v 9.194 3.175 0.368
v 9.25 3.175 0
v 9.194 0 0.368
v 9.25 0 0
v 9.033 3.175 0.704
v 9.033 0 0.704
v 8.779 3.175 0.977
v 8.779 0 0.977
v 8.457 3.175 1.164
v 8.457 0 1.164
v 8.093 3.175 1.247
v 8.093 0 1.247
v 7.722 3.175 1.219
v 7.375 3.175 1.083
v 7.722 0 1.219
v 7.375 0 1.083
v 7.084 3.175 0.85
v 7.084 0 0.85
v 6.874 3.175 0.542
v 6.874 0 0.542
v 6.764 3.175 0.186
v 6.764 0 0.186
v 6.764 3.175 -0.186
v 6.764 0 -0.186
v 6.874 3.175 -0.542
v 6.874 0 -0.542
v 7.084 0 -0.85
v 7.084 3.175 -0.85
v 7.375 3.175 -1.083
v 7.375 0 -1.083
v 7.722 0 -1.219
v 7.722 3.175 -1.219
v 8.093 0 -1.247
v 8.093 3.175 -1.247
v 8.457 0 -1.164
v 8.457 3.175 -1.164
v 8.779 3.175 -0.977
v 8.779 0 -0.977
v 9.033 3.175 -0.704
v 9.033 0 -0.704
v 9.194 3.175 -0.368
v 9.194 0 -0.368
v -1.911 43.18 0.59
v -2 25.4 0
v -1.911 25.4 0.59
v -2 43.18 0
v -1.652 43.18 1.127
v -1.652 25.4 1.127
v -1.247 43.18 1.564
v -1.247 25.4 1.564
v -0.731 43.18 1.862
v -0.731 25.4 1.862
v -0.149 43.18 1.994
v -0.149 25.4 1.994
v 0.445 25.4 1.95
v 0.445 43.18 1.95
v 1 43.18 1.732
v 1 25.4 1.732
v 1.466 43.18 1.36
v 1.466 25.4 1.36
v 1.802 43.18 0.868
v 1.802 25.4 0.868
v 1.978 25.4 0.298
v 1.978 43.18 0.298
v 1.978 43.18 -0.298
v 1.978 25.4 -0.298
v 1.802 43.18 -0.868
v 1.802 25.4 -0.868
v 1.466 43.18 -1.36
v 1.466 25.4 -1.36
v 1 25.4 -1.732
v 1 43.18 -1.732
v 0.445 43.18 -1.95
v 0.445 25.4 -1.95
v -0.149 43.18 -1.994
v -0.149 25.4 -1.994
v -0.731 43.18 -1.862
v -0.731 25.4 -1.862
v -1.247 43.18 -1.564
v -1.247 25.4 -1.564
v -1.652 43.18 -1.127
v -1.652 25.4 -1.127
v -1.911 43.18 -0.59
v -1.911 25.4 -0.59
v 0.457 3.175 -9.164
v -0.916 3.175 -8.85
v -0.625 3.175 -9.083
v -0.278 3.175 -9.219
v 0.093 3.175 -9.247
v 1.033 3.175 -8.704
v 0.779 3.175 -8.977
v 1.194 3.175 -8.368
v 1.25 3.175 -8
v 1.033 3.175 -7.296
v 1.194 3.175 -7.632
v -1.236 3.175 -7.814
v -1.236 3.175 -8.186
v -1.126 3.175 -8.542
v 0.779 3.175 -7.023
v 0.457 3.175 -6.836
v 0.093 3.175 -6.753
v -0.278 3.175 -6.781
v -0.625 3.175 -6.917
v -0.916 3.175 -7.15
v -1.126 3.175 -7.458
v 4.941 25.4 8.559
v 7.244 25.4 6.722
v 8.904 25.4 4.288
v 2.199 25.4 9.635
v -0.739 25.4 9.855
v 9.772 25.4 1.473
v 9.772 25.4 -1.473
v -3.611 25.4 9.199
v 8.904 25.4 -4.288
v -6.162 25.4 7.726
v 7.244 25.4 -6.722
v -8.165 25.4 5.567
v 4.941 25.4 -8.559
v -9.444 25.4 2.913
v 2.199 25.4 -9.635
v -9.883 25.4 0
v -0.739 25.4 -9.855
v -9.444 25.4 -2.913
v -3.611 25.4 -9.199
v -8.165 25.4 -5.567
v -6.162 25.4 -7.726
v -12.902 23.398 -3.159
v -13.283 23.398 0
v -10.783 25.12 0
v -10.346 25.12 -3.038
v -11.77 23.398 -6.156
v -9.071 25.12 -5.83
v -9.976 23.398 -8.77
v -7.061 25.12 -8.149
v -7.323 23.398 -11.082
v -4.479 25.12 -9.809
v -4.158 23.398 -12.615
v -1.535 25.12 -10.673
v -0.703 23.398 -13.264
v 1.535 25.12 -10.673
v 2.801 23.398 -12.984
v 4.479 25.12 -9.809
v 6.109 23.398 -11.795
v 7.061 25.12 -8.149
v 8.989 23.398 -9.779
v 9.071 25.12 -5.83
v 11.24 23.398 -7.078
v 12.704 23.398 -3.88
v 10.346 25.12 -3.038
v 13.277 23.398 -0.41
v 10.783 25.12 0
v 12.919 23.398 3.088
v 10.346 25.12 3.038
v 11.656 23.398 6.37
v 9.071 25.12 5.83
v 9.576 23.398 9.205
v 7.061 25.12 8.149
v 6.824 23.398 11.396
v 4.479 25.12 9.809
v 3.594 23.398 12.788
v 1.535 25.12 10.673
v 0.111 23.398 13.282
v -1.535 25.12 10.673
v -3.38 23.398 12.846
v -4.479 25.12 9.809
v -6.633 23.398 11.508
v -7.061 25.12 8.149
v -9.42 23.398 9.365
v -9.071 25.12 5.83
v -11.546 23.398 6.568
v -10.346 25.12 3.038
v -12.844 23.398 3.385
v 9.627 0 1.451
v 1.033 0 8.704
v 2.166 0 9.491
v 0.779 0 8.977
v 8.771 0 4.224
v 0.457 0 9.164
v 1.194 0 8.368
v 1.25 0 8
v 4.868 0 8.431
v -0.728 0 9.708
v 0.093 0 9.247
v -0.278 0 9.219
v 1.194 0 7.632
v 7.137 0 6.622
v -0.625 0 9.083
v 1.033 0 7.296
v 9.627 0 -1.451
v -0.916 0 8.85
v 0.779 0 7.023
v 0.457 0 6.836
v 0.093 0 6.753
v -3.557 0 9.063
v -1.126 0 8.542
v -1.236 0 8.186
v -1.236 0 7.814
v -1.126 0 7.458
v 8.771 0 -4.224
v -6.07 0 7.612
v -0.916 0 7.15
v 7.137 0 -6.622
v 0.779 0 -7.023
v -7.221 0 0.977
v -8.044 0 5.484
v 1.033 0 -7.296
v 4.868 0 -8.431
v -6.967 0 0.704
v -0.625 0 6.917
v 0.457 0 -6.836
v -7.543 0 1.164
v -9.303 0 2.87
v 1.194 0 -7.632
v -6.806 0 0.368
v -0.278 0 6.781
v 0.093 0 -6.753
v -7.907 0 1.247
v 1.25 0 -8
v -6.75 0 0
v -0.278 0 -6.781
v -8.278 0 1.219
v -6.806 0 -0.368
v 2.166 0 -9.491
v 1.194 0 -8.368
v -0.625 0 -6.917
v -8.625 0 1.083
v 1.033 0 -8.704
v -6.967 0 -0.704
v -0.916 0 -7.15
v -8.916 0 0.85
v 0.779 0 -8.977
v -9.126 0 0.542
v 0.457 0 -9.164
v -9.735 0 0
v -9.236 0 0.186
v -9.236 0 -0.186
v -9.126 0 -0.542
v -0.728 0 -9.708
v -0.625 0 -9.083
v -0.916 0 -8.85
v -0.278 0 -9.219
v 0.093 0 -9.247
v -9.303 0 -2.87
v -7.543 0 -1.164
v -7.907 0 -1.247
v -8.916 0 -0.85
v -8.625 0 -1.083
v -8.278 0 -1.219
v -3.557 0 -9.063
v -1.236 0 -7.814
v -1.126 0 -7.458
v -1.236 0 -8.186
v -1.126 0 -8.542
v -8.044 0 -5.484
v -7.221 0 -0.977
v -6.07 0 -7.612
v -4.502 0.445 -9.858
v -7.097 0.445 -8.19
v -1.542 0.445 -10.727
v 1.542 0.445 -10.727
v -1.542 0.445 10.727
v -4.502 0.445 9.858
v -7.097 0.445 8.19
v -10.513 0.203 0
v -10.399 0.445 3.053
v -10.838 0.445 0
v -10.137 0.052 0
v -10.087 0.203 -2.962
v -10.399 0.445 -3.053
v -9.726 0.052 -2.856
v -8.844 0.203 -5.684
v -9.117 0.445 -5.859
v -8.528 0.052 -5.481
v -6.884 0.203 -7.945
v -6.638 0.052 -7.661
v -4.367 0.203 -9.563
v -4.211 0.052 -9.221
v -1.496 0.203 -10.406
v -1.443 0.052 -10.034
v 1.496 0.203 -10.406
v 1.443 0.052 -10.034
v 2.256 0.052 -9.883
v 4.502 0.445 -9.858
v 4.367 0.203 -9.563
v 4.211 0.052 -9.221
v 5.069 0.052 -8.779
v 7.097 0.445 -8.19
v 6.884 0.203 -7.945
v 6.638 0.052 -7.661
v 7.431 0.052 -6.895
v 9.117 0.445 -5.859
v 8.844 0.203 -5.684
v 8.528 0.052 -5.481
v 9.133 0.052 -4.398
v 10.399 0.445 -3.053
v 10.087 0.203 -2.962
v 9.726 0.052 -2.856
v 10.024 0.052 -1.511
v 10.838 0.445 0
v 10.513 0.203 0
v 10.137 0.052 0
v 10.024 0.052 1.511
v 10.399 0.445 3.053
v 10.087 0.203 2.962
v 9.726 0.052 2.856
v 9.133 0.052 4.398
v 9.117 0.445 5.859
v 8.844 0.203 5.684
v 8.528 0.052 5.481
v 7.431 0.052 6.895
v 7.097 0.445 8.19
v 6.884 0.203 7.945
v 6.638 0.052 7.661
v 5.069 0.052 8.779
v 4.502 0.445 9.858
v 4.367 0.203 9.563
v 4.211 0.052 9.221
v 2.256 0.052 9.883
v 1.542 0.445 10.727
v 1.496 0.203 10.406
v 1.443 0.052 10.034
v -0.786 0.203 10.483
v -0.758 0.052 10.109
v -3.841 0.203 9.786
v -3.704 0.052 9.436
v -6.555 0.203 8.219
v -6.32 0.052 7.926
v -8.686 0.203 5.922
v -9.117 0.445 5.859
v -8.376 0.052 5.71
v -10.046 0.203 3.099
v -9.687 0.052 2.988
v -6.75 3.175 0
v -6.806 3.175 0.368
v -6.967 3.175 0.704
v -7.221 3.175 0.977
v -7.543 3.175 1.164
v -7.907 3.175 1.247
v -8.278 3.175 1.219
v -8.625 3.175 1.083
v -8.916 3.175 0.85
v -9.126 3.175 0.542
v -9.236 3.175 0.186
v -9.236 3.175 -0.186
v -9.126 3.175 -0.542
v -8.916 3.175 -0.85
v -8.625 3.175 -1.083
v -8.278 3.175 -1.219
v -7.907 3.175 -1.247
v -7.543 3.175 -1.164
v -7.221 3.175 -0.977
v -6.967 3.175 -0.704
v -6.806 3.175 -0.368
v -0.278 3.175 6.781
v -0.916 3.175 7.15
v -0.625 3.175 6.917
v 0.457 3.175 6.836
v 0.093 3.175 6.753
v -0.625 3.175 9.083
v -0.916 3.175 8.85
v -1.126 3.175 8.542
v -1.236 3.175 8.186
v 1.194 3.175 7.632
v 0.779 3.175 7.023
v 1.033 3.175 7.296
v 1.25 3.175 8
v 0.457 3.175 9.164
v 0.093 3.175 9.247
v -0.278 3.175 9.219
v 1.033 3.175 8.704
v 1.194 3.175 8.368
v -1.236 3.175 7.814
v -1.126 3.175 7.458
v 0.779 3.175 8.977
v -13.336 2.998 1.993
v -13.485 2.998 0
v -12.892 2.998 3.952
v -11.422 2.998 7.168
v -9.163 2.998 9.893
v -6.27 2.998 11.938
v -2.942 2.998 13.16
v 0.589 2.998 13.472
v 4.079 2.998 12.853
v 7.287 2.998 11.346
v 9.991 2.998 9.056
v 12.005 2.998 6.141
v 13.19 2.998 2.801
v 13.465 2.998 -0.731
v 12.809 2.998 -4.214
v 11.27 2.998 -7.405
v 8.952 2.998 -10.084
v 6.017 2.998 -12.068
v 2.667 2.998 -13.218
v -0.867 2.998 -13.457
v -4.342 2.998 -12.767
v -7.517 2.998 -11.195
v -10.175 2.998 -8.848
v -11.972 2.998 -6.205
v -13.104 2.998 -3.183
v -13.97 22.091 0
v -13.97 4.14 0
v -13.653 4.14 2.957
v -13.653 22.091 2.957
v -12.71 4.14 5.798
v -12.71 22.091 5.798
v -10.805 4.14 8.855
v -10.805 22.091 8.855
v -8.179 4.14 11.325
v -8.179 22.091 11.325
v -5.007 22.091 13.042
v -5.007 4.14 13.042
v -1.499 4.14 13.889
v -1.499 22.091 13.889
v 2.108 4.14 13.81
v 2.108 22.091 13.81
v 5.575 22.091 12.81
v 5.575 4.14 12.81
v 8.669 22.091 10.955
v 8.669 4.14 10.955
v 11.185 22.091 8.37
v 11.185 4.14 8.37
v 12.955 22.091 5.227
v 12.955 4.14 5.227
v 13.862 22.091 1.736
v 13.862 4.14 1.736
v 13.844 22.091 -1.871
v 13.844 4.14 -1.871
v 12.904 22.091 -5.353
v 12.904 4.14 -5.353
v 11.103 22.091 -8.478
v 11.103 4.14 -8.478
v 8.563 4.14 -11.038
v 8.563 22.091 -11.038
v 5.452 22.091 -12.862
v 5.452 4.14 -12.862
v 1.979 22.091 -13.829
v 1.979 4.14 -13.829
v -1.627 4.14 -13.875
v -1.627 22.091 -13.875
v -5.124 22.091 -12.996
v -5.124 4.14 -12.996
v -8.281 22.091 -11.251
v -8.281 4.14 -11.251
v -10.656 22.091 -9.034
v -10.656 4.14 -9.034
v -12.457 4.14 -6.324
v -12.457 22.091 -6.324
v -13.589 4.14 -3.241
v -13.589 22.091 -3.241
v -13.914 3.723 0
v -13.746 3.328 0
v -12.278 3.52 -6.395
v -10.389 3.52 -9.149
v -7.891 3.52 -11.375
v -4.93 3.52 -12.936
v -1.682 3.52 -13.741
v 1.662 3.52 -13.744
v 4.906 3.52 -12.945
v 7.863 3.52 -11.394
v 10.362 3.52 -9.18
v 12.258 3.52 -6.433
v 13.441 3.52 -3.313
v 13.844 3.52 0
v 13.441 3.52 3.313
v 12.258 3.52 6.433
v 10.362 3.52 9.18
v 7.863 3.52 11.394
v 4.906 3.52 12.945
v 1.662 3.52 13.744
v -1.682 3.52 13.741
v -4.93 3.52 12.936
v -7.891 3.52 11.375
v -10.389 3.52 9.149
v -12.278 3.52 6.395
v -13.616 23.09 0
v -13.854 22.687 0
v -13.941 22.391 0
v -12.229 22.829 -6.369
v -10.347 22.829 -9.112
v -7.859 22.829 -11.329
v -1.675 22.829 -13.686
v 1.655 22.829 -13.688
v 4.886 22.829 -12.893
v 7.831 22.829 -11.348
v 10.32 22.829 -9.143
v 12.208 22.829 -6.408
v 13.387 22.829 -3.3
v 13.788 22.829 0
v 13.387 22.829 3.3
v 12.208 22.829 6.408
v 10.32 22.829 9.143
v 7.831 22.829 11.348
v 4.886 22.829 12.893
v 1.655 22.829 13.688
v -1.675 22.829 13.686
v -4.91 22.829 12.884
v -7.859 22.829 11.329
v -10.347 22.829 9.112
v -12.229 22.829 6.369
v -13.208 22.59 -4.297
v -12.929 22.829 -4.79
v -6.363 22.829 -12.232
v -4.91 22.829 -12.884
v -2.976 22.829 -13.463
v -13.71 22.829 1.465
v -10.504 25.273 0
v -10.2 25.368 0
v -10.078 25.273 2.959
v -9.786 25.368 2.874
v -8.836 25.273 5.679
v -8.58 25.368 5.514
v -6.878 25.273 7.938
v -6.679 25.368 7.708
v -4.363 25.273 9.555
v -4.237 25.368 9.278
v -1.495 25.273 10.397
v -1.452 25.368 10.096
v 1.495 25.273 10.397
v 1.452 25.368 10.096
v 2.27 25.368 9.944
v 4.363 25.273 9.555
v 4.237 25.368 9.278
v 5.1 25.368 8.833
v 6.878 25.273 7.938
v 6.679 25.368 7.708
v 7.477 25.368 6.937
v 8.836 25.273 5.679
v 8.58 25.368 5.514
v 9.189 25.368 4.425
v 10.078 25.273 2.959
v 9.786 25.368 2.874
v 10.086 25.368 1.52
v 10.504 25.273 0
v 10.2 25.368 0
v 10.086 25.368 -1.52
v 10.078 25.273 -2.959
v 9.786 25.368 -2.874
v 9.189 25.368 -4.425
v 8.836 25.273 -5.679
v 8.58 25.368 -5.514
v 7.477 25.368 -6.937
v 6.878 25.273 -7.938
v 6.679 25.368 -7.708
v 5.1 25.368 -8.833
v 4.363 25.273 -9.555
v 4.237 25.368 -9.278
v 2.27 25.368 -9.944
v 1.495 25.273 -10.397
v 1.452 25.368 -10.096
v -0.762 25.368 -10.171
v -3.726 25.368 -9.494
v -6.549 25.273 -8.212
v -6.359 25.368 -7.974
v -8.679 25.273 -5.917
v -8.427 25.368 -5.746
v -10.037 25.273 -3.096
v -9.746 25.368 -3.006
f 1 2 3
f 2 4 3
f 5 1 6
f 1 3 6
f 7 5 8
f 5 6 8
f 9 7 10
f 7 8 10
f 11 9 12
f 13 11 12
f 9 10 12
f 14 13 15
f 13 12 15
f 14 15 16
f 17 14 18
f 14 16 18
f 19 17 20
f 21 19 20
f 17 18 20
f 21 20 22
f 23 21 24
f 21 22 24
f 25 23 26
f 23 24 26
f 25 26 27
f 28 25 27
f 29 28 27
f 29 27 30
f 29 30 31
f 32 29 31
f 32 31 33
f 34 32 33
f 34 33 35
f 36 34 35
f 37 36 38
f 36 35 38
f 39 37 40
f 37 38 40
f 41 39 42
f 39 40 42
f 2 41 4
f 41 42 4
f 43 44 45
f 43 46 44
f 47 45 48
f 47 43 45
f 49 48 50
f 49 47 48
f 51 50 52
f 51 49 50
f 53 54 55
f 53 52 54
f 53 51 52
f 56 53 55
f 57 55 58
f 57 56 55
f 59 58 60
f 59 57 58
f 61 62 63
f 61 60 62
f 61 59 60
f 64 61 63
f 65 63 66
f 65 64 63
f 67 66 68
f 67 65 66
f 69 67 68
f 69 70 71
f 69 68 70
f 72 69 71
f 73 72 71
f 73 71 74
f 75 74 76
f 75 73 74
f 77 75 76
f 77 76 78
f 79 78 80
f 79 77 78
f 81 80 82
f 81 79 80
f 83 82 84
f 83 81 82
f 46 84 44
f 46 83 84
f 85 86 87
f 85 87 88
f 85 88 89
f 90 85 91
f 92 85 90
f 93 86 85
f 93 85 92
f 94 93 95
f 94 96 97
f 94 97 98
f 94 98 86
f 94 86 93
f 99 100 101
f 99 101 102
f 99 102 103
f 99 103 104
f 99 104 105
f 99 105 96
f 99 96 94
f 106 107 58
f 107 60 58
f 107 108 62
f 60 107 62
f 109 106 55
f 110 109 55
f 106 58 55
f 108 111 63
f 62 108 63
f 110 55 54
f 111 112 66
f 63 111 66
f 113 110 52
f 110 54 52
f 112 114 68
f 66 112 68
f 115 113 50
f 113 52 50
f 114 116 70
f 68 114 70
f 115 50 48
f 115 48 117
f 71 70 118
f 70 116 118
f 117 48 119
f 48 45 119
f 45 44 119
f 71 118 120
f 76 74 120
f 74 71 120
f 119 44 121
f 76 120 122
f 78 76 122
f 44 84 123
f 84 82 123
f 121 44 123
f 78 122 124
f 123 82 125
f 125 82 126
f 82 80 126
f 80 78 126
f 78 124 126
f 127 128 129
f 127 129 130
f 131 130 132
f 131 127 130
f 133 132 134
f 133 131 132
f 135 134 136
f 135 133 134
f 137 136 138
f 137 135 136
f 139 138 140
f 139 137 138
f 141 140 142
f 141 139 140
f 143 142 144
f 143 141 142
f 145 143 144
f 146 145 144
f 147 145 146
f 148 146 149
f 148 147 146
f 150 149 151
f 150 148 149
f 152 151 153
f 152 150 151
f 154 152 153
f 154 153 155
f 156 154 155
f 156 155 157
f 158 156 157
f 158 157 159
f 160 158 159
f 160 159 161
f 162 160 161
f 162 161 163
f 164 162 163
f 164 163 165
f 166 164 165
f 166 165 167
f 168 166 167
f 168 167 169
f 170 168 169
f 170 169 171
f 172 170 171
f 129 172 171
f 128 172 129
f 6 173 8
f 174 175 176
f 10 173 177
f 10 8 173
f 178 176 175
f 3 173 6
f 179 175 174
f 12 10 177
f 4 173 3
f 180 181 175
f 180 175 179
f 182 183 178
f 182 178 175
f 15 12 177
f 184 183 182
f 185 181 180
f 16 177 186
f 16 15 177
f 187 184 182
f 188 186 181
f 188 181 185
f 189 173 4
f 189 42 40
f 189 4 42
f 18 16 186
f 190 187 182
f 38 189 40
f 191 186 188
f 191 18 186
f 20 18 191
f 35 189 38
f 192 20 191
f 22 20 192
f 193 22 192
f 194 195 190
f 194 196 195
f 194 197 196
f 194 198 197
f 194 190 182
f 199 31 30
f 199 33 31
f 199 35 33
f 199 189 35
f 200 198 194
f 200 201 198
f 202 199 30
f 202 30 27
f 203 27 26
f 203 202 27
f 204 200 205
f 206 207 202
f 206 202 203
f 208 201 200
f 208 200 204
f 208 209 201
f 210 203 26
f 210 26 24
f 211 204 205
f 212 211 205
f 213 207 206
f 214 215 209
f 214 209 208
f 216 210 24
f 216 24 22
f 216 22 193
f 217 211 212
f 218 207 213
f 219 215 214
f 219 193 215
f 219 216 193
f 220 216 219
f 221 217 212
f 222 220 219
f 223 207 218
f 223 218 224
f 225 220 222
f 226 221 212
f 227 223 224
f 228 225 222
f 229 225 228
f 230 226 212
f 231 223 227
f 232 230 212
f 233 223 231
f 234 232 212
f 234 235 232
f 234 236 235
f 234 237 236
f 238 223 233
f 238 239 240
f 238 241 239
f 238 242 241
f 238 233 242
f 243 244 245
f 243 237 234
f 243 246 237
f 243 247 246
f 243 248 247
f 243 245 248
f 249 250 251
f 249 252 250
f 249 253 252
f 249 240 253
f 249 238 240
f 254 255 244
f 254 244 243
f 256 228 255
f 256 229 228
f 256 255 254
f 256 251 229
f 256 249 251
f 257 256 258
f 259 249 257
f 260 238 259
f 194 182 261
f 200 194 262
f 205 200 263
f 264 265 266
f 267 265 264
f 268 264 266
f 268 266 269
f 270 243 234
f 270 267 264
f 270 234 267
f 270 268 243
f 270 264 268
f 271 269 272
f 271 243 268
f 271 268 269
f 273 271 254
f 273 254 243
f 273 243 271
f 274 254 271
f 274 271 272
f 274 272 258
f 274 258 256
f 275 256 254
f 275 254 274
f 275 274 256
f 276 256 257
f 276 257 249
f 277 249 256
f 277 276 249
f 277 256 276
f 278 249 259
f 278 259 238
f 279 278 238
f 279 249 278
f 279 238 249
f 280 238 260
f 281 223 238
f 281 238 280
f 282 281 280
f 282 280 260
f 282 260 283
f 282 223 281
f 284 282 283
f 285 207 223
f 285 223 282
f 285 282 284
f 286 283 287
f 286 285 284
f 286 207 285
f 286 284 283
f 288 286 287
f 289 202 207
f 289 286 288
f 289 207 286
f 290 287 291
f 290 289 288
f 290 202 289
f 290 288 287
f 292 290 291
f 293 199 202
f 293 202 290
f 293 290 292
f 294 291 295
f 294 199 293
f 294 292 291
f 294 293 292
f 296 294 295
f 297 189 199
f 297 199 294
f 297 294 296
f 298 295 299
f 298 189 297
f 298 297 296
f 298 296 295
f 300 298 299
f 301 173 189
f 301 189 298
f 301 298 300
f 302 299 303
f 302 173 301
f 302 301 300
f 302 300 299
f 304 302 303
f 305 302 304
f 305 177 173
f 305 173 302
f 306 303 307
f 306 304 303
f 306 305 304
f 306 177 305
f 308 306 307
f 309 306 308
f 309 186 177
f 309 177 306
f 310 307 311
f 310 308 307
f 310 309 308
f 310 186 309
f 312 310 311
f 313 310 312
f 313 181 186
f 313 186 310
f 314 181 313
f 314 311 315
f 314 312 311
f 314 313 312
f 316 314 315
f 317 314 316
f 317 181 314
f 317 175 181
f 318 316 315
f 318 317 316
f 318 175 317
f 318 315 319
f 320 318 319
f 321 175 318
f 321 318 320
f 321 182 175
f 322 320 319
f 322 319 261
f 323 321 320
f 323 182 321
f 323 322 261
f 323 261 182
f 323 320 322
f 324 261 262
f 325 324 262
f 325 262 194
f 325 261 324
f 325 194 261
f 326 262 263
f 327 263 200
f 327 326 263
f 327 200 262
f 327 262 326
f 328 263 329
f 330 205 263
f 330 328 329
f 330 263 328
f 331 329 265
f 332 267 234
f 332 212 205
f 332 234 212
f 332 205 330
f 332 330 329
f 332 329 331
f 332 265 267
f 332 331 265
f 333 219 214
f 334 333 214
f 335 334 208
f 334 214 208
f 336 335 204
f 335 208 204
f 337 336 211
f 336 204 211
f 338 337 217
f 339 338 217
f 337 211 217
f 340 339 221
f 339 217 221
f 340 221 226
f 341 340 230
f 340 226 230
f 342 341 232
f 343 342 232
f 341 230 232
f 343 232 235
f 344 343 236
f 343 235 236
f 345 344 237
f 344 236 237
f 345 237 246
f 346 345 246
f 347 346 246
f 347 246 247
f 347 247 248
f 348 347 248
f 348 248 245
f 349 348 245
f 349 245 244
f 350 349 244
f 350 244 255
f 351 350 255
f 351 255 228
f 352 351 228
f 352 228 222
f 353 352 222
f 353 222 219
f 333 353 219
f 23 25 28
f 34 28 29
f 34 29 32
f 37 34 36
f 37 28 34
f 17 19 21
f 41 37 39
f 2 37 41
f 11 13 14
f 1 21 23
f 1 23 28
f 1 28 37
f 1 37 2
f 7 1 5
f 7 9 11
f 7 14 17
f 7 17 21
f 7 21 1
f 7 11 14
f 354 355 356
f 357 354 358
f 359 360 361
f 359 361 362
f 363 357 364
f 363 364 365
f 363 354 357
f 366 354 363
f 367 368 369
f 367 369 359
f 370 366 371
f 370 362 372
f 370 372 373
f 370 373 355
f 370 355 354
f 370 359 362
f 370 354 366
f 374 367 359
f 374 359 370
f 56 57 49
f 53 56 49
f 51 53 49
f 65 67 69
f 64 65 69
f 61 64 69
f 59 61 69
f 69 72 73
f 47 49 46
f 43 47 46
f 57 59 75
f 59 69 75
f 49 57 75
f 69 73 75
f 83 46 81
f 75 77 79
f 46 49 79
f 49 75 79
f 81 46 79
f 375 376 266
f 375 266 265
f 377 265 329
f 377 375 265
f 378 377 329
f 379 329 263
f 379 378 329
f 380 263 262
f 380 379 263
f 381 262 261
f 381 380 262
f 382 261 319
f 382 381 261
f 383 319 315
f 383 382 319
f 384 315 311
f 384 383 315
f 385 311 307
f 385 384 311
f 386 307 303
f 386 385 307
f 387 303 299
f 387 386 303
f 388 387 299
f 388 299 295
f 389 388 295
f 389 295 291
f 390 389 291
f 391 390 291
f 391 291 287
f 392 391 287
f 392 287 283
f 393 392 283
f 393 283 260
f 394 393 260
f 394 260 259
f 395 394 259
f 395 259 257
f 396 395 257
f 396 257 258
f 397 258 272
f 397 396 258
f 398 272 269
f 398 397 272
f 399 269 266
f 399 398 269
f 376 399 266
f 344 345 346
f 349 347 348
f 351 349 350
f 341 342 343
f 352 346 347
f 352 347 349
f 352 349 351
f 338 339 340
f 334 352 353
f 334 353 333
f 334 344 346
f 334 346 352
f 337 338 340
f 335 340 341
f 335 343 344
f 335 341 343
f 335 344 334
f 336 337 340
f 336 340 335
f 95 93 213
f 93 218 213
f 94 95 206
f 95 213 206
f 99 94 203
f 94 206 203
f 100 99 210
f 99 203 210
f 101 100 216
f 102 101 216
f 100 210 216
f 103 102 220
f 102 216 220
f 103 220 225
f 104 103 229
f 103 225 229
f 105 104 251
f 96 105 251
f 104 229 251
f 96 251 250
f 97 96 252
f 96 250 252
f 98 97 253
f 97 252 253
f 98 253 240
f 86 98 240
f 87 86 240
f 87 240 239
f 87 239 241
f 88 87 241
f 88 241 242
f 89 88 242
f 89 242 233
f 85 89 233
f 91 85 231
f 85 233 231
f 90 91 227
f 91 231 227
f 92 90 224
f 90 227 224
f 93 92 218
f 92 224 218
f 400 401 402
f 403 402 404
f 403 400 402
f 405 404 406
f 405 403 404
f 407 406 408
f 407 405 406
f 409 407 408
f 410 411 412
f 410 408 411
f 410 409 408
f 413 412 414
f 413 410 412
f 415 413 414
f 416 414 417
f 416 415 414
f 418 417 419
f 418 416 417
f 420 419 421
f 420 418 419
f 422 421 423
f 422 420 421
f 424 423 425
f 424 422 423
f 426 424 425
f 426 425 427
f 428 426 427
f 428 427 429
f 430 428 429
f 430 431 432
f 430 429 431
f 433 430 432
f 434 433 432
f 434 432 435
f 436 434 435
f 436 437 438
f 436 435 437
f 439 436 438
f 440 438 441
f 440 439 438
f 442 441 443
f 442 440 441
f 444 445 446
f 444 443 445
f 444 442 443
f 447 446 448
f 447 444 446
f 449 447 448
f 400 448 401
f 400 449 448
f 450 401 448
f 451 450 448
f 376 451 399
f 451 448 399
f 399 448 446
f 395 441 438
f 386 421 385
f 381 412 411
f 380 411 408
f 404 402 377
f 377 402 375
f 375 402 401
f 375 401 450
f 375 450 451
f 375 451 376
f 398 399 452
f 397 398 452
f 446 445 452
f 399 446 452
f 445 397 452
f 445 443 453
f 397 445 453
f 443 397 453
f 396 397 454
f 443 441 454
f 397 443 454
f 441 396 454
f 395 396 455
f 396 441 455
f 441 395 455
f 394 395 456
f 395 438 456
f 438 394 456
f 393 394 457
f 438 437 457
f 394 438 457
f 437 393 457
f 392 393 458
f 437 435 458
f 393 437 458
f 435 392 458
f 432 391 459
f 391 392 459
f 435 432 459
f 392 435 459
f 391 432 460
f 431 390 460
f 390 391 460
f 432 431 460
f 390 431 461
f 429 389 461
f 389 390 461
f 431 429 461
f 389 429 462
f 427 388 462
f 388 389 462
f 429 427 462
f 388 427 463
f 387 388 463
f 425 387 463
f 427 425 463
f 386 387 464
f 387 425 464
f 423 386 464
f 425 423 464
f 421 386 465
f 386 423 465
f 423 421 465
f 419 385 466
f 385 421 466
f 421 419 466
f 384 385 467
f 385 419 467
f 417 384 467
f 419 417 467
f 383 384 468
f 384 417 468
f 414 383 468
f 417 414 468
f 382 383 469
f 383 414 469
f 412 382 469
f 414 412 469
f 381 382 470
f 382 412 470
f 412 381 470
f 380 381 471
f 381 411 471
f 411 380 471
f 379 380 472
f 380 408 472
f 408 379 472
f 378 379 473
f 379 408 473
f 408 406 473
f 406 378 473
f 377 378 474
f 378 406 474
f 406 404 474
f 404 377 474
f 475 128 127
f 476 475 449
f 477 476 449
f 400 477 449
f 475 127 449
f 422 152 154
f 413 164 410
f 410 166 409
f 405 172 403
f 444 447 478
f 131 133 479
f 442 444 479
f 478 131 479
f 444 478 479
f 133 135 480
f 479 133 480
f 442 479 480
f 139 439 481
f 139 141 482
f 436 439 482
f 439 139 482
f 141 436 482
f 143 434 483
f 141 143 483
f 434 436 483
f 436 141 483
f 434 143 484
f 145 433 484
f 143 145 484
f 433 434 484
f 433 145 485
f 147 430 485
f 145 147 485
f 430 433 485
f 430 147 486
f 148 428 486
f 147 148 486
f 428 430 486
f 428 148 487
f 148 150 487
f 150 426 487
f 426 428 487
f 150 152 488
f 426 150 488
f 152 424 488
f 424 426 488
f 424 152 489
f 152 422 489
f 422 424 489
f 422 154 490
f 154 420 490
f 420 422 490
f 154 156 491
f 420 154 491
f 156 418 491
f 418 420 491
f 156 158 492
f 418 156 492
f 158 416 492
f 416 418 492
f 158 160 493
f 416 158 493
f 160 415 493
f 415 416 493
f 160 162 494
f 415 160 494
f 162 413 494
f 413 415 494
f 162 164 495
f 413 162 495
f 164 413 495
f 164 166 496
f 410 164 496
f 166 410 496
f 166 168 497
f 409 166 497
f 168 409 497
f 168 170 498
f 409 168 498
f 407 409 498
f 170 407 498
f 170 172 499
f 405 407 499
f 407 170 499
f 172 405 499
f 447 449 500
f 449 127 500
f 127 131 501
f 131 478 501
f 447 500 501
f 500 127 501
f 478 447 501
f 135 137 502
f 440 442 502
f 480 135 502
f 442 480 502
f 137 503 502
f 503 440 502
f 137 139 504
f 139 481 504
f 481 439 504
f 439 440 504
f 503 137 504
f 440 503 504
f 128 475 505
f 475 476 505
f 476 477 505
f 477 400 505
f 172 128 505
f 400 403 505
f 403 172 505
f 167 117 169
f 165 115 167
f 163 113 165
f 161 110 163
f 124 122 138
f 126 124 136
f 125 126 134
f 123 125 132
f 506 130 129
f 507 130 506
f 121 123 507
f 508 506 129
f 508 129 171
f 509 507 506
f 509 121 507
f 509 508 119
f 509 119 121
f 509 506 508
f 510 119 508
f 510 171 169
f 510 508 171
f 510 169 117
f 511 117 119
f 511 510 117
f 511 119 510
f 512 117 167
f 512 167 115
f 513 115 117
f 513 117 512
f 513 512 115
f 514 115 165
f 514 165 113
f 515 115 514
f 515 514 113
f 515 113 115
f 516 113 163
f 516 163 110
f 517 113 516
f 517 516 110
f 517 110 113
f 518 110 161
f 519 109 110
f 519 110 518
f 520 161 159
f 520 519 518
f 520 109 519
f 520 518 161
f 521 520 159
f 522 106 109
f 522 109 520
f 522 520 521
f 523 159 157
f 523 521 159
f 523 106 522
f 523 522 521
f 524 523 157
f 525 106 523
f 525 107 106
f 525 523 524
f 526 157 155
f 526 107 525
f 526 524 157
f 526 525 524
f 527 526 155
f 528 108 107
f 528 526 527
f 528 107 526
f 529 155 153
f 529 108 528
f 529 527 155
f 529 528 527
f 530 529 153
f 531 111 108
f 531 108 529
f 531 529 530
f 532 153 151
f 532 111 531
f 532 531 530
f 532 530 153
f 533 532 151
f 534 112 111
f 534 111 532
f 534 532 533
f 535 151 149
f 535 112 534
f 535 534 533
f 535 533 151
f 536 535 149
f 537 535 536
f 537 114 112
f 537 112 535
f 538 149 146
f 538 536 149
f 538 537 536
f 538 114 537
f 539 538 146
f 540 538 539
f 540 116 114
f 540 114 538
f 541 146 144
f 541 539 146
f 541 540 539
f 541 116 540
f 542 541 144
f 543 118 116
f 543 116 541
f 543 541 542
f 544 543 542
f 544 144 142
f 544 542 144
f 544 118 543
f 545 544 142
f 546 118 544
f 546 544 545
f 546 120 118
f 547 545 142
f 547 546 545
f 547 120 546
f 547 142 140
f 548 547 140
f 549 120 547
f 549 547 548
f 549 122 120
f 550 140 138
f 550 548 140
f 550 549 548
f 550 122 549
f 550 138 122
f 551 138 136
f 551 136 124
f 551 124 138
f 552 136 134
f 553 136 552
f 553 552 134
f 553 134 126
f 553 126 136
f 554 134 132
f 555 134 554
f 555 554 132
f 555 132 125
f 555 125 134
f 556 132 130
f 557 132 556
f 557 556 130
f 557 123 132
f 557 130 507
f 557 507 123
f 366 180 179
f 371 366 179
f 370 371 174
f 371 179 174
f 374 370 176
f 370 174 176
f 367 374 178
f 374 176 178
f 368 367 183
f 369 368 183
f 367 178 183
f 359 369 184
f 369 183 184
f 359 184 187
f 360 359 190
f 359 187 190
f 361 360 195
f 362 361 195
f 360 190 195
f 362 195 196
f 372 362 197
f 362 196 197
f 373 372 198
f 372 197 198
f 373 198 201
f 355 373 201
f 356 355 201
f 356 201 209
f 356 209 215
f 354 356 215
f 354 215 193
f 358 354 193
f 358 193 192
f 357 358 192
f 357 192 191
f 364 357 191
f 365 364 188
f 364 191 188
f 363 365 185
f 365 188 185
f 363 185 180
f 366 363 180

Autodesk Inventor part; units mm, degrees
ref_plane "YZ Plane" through (0, 0, 0) normal (1, 0, 0) x (0, 1, 0)
ref_plane "XZ Plane" through (0, 0, 0) normal (0, 1, 0) x (-1, 0, 0)
ref_plane "XY Plane" through (0, 0, 0) normal (0, 0, 1) x (1, 0, 0)
sketch "Sketch1" plane through (0, 0, 0) normal (0, 0, 1) x (1, 0, 0)
  line L0 (0, 43.18) -> (0, 0)
  line L1 (-10.3763, 25.4) -> (-2, 25.4)
  line L2 (-2, 25.4) -> (-2, 43.18)
  line L3 (-2, 43.18) -> (0, 43.18)
  line L4 (0, 0) -> (-10.3763, 0)
  line L5 (-10.3763, 0) -> (-13.97, 3.466)
  line L6 (-13.97, 3.466) -> (-13.97, 22.9252)
  line L7 (-13.97, 22.9252) -> (-10.3763, 25.4)
  point P0 (0, 21.59)
  dimension "d18" = 2
  dimension "d19" = 17.78
  dimension "d23" = 25.4
  dimension "d25" = 13.97
revolve "Revolution1" add sketch "Sketch1" angle 360 about axis through (0, 43.18, 0) along (0, -1, 0)
fillet "Fillet3" radius 1.5875 1 edges at (10.3763, 25.4, 0)
fillet "Fillet4" radius 1.5875 1 edges at (13.97, 22.9252, 0)
fillet "Fillet5" radius 1.5875 2 edges at (13.97, 3.466, 0) (10.3763, 0, 0)
sketch "Sketch2" plane through (0, 0, 0) normal (0, -1, 0) x (1, 0, 0)
  circle A0 centre (0, 0) radius 9.7355 projected
  circle A1 centre (8, 0) radius 1.25
  circle A2 centre (0, 8) radius 1.25
  circle A3 centre (-8, 0) radius 1.25
  circle A4 centre (0, -8) radius 1.25
  dimension "d29" = 2.5
  dimension "d32" = 360
  dimension "d36" = 8
extrude "Extrusion1" cut sketch "Sketch2" against normal blind 3.175 contours A1 | A2 | A3 | A4
properties part number "MotorTop"
